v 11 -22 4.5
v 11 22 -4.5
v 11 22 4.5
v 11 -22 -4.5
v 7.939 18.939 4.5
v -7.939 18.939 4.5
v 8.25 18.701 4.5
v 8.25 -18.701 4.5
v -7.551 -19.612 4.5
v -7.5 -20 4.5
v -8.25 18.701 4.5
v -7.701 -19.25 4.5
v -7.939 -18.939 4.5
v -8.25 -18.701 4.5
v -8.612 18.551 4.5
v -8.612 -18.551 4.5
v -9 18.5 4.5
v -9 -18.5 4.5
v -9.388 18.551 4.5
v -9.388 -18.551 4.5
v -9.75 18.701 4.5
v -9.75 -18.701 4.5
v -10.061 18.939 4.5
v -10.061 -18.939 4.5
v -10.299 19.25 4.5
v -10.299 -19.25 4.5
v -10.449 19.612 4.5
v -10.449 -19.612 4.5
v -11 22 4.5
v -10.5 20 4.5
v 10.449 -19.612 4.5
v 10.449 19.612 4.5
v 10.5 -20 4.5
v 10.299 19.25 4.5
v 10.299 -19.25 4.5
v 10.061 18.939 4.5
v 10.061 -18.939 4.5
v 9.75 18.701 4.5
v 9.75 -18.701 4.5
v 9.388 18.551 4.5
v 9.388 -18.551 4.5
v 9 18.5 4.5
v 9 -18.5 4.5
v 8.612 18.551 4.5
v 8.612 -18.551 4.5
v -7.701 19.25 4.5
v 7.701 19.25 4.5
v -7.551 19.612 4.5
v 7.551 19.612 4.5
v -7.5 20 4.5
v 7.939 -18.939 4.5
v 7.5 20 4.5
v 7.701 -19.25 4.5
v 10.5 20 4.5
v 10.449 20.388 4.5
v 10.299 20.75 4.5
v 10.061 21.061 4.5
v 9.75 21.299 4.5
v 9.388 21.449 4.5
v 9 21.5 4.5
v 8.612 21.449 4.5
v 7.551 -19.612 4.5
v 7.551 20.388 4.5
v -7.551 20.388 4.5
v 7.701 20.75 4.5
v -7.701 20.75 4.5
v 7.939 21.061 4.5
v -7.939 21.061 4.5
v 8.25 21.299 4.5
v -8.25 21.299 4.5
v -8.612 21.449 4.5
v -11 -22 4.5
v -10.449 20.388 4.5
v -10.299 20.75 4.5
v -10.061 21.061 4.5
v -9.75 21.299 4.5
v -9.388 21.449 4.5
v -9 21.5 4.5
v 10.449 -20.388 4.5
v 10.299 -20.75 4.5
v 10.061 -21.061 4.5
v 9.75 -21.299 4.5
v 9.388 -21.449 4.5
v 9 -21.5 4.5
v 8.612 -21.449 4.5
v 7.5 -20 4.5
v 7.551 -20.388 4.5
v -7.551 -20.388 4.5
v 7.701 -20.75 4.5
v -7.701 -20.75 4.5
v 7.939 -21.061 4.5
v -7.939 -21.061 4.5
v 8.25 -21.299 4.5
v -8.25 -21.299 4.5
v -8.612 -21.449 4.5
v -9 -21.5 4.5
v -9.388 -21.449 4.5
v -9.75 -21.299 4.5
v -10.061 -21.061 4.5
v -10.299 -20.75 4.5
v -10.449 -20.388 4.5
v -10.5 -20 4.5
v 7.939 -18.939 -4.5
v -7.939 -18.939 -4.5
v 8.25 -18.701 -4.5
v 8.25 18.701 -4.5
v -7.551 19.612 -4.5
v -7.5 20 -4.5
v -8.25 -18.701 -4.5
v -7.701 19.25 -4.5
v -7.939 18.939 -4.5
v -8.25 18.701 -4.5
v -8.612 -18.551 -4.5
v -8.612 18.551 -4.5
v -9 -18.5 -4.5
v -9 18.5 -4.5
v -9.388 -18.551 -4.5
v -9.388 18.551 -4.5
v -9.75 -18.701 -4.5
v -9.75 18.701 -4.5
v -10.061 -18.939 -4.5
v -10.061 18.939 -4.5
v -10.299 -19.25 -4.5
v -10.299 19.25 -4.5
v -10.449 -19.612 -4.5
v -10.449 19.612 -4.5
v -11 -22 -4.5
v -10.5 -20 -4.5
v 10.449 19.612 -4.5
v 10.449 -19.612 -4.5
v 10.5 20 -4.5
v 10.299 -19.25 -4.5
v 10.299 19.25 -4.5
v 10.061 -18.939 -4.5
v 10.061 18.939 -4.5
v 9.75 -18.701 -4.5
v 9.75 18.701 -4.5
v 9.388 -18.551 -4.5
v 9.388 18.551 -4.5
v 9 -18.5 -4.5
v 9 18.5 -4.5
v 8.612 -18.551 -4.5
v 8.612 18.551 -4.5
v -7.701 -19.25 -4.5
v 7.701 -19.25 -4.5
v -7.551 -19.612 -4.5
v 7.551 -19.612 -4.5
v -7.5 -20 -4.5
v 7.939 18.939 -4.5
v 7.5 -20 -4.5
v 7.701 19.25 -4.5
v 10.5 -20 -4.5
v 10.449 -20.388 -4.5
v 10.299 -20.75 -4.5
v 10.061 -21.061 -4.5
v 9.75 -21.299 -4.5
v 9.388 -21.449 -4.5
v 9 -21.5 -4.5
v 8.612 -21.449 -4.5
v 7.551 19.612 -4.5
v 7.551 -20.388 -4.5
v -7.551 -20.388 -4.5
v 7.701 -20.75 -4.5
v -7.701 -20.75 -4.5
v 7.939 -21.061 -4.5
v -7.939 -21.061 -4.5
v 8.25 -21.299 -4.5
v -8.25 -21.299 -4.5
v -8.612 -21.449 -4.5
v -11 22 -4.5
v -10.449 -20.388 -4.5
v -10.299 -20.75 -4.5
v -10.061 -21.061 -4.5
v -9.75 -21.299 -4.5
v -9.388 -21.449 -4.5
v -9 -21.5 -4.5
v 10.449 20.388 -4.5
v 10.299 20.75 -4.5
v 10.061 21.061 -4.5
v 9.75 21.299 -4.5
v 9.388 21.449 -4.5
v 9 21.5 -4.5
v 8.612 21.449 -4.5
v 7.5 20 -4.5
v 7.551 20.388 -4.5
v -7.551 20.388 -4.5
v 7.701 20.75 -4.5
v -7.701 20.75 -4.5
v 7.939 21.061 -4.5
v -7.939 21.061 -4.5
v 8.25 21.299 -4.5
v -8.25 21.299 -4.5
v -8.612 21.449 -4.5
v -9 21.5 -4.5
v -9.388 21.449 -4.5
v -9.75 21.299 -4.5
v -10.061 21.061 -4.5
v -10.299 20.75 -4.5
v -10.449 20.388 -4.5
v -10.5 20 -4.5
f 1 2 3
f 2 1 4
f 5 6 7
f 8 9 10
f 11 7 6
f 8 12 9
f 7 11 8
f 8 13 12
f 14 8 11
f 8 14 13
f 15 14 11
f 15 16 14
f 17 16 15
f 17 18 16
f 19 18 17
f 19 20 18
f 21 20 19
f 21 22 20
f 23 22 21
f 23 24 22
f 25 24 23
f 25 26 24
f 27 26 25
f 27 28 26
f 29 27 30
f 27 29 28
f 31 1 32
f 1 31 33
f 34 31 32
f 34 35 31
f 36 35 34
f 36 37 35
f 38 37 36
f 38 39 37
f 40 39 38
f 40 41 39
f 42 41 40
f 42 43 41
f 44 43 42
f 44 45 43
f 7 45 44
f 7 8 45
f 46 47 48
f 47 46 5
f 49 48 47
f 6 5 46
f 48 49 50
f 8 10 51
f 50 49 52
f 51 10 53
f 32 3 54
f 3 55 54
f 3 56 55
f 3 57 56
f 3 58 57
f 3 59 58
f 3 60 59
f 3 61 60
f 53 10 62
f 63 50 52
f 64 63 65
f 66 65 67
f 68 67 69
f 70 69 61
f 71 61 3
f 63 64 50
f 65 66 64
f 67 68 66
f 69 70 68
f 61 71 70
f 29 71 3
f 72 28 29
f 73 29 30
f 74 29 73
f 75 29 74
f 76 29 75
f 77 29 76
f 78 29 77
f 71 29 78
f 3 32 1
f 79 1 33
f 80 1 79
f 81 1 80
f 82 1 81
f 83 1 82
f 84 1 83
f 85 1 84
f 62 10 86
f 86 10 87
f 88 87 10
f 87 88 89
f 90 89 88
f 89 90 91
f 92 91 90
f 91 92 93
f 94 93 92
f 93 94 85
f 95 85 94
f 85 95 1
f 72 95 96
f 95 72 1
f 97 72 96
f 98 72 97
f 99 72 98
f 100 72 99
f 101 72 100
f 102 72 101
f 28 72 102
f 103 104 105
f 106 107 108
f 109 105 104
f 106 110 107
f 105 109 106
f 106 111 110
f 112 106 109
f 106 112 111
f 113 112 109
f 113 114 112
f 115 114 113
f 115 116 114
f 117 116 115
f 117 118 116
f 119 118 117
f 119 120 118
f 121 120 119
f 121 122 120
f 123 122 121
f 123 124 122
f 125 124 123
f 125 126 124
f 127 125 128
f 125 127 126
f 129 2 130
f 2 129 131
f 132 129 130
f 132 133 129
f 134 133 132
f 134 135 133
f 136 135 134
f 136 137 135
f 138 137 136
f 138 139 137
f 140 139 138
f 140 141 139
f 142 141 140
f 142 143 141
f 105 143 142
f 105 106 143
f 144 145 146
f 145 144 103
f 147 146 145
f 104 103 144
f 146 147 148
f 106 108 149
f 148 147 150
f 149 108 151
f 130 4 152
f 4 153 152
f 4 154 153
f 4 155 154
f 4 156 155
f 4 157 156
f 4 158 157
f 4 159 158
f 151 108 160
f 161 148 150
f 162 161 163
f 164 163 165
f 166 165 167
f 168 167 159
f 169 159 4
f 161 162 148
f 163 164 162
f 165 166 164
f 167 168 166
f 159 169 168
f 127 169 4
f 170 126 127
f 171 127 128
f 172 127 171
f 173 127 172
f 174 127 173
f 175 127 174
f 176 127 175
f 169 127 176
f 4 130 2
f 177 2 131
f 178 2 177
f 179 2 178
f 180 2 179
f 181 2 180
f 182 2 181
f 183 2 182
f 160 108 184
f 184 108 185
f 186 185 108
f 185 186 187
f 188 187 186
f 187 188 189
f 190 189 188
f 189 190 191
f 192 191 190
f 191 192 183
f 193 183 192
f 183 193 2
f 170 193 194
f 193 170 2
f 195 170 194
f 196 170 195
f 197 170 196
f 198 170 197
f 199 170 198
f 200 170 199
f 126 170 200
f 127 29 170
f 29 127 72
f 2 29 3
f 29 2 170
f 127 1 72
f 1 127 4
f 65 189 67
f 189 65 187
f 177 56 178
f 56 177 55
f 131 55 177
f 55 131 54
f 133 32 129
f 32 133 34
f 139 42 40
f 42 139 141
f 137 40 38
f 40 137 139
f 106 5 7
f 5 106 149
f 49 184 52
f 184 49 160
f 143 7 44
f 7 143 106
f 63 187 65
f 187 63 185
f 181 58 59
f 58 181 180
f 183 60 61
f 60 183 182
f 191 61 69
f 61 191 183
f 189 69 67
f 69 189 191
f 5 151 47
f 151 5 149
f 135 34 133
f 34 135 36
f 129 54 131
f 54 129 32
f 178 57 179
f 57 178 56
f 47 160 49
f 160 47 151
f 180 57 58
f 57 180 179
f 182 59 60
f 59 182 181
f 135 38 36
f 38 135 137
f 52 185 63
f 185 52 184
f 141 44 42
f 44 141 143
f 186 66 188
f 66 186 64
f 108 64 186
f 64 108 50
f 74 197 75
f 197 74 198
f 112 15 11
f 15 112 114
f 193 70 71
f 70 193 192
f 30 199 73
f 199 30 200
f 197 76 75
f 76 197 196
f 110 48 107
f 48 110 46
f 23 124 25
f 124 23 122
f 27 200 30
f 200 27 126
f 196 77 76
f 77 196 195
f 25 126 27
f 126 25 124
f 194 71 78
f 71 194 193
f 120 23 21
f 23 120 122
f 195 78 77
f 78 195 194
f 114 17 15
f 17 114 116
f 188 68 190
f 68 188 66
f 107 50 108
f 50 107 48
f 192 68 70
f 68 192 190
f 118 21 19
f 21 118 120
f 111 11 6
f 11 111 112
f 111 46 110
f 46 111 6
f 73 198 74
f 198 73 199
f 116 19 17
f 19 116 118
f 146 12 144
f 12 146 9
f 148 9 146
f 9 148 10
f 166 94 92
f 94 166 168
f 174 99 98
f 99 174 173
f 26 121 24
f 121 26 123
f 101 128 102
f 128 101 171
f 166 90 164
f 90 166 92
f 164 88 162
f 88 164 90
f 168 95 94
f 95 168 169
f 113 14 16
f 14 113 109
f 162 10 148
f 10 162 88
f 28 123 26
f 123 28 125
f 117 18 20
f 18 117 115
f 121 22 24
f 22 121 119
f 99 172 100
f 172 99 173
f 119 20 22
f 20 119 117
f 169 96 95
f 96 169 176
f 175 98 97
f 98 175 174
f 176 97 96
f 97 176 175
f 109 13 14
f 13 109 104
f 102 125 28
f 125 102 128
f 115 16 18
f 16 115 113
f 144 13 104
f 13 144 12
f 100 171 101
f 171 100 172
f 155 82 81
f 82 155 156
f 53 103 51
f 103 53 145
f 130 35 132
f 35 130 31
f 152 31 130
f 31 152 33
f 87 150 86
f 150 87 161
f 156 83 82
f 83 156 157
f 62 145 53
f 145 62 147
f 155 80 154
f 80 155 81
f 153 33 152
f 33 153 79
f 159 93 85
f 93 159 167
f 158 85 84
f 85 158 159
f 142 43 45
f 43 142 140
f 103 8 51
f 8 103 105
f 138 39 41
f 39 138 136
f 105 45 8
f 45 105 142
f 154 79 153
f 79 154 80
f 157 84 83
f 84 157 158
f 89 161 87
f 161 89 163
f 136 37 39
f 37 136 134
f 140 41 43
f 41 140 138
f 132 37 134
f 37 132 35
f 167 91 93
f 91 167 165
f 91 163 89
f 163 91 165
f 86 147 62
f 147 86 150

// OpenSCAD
$fa=1;
$fs=0.4;

module pcb(width=22, length=40, thickness=9, radius=5)
{
    difference(){
        cube([width, length, thickness], center=true);
        translate([width/2-2,length/2-2,-thickness])
            cylinder(r=radius, thickness*2);
        translate([-width/2+2,length/2-2,-thickness])
            cylinder(r=radius, thickness*2);
        translate([-width/2+2,-length/2+2,-thickness])
            cylinder(r=radius, thickness*2);
        translate([width/2-2,-length/2+2,-thickness])
            cylinder(r=radius, thickness*2);
    }
}

pcb_width = 22;
pcb_length = 44;
pcb_thickness = 9;
pcb_hole_radius = 3/2;

pcb (pcb_width, pcb_length, pcb_thickness, pcb_hole_radius);
// module half_cylinder(radius=5, height=5)
// {
//     difference(){
//         cylinder(r=radius, height);
//         // halved
//         translate([0, radius, -0.1])
//             cube([2*radius,2*radius,3*height],center=true);
//     }
// }
//
// // base
// module base(radius=5, height=5)
// {
//     base_t = 1;
//     airpocket_t = height-base_t;
//     // hollow half-cylinder
//     difference(){
//         //half_cylinder(radius, height);
//         cylinder(r=radius,height);
//         translate([0,0,base_t])
//             //half_cylinder(1*(radius-base_t), 1.1*height);
//             cylinder(r=radius-base_t, 1.1*height);
//     }
//     // backplate
//     //translate([0,-0.5,height/2])
//     //cube([radius*2,1,height],center=true);
// }
//
// module depressor(width=5, height=20, thickness=1)
// {
//     radius = width/2;
//
//     translate([0,radius,0])
//     hull(){
//         cube([width, width, thickness], center=true);
//         translate([0,height,0])
//             cylinder(r=radius, thickness, center=true);
//     }
// }
//
// module plunger(radius=10, height=50, thickness=1)
// {
//
//     //half_cylinder(radius, thickness);
//     cylinder(r=radius,thickness);
//     //translate([0,-thickness/2,0])
//         rotate([90,0,0])
//         depressor(radius, height, thickness);
// }
//
// module cage(width=10, height=50)
// {
//     cage_overlap=3;
//     cage_width = width*2;
//     cage_height = height+cage_overlap;
//     post_thickness = 2;
//     bottom_thickness = 2;
//     cutout_xy = cage_width-2*post_thickness;
//     cutout_z = cage_height;// + bottom_thickness - cage_overlap;
//
//     translate([0,0,(height+cage_overlap)/2])
//     difference(){
//         // outer
//         cube([cage_width, cage_width, cage_height], center=true);
//         // inner
//         translate([0, 0, bottom_thickness])
//             cube([2*cutout_xy, cutout_xy, cutout_z], center=true);
//         translate([0, 0, bottom_thickness])
//             cube([cutout_xy, 2*cutout_xy, cutout_z], center=true);
//     }
// }
//
// module enclosure(width=10, height=50, margin=2)
// {
//     // detect box (upper)
//     detect_x = width*2;
//     detect_y = width*4;
//     detect_z = height;
//     // slot cutout
//     slot_x = width + margin*3;
//     slot_y = margin*2;
//     slot_z = detect_z*2;
//     // mount box (lower)
//     mount_x = detect_x;
//     mount_y = detect_y;
//     mount_z = 10;
//     // combined
//     box_x = detect_x;
//     box_y = detect_y;
//     box_z = detect_z + mount_z;
//     // detect box
//     translate([0,0,box_z/2])
//     difference(){
//         // outer
//         cube([box_x, box_y, box_z], center=true);
//         // inner
//         translate([0, -box_y/4, 0])
//             cube([slot_x, slot_y, slot_z], center=true);
//
//         // led cutouts
//         translate([0,0,box_z/3])
//             rotate([90,0,0])
//                 cylinder(r=2.5, h=4*box_z, center=true);
//         translate([0,0,-box_z/3+mount_z])
//             rotate([90,0,0])
//                 cylinder(r=2.5, h=4*box_z, center=true);
//         // mount cutout
//         translate([0,mount_y/3,-box_z/4-mount_z])
//             cube([mount_x*1.1,10,mount_z*1.1],center=true);
//         // screw hole
//         translate([0,mount_y/2,-mount_z-detect_z/4])
//             rotate([90,0,0])
//                 cylinder(r=1.0, h=mount_x/2, center=true);
//     }
// }
//
// module enclosure_final(width=10, height=50, cheight=50, margin=3)
// {
//     difference()
//     {
//         enclosure(width, height,2);
//         translate([45-3*capsule_radius,-15,-plunger_height-capsule_height])
//             cage(width+0.1, cheight);
//     }
// }
//
// capsule_radius = 15;
// capsule_height = 15;
// plunger_height = 50;
// plunger_thickness = 2;
//
// color("blue")
// cage(capsule_radius, plunger_height+capsule_height);
// translate([0,0,plunger_thickness])
// base(capsule_radius, capsule_height);
// translate([0,0,plunger_thickness+capsule_height])
// plunger(capsule_radius, plunger_height, plunger_thickness);
//
// translate([2.5*capsule_radius,0,0])
// base(capsule_radius, capsule_height);
//
// translate([-3*capsule_radius,0,0])
// enclosure(capsule_radius, plunger_height,2);
//
// translate([-3*capsule_radius,-15,-plunger_height-capsule_height])
// {
//     color("green")
//     cage(capsule_radius, plunger_height+capsule_height);
//
//     translate([0,0,2])
//     color("brown")
//     base(capsule_radius, capsule_height);
//
//     translate([0,0,capsule_height+2])
//     color("red")
//     plunger(capsule_radius, plunger_height, plunger_thickness);
// }
//
// translate([100,0,0])
// enclosure_final(capsule_radius, plunger_height, plunger_height+capsule_height, 2);
//
// // STL builds
// // CAGE
// //cage(capsule_radius, plunger_height+capsule_height);
//
// // BASE
// //base(capsule_radius, capsule_height);
//
// // PLUNGER
// //plunger(capsule_radius, plunger_height, plunger_thickness);
//
// // ENCLOSURE
// //rotate([180,0,0])
// //translate([0,0,-plunger_height-10])
// //enclosure_final(capsule_radius, plunger_height, plunger_height+capsule_height, 2);
